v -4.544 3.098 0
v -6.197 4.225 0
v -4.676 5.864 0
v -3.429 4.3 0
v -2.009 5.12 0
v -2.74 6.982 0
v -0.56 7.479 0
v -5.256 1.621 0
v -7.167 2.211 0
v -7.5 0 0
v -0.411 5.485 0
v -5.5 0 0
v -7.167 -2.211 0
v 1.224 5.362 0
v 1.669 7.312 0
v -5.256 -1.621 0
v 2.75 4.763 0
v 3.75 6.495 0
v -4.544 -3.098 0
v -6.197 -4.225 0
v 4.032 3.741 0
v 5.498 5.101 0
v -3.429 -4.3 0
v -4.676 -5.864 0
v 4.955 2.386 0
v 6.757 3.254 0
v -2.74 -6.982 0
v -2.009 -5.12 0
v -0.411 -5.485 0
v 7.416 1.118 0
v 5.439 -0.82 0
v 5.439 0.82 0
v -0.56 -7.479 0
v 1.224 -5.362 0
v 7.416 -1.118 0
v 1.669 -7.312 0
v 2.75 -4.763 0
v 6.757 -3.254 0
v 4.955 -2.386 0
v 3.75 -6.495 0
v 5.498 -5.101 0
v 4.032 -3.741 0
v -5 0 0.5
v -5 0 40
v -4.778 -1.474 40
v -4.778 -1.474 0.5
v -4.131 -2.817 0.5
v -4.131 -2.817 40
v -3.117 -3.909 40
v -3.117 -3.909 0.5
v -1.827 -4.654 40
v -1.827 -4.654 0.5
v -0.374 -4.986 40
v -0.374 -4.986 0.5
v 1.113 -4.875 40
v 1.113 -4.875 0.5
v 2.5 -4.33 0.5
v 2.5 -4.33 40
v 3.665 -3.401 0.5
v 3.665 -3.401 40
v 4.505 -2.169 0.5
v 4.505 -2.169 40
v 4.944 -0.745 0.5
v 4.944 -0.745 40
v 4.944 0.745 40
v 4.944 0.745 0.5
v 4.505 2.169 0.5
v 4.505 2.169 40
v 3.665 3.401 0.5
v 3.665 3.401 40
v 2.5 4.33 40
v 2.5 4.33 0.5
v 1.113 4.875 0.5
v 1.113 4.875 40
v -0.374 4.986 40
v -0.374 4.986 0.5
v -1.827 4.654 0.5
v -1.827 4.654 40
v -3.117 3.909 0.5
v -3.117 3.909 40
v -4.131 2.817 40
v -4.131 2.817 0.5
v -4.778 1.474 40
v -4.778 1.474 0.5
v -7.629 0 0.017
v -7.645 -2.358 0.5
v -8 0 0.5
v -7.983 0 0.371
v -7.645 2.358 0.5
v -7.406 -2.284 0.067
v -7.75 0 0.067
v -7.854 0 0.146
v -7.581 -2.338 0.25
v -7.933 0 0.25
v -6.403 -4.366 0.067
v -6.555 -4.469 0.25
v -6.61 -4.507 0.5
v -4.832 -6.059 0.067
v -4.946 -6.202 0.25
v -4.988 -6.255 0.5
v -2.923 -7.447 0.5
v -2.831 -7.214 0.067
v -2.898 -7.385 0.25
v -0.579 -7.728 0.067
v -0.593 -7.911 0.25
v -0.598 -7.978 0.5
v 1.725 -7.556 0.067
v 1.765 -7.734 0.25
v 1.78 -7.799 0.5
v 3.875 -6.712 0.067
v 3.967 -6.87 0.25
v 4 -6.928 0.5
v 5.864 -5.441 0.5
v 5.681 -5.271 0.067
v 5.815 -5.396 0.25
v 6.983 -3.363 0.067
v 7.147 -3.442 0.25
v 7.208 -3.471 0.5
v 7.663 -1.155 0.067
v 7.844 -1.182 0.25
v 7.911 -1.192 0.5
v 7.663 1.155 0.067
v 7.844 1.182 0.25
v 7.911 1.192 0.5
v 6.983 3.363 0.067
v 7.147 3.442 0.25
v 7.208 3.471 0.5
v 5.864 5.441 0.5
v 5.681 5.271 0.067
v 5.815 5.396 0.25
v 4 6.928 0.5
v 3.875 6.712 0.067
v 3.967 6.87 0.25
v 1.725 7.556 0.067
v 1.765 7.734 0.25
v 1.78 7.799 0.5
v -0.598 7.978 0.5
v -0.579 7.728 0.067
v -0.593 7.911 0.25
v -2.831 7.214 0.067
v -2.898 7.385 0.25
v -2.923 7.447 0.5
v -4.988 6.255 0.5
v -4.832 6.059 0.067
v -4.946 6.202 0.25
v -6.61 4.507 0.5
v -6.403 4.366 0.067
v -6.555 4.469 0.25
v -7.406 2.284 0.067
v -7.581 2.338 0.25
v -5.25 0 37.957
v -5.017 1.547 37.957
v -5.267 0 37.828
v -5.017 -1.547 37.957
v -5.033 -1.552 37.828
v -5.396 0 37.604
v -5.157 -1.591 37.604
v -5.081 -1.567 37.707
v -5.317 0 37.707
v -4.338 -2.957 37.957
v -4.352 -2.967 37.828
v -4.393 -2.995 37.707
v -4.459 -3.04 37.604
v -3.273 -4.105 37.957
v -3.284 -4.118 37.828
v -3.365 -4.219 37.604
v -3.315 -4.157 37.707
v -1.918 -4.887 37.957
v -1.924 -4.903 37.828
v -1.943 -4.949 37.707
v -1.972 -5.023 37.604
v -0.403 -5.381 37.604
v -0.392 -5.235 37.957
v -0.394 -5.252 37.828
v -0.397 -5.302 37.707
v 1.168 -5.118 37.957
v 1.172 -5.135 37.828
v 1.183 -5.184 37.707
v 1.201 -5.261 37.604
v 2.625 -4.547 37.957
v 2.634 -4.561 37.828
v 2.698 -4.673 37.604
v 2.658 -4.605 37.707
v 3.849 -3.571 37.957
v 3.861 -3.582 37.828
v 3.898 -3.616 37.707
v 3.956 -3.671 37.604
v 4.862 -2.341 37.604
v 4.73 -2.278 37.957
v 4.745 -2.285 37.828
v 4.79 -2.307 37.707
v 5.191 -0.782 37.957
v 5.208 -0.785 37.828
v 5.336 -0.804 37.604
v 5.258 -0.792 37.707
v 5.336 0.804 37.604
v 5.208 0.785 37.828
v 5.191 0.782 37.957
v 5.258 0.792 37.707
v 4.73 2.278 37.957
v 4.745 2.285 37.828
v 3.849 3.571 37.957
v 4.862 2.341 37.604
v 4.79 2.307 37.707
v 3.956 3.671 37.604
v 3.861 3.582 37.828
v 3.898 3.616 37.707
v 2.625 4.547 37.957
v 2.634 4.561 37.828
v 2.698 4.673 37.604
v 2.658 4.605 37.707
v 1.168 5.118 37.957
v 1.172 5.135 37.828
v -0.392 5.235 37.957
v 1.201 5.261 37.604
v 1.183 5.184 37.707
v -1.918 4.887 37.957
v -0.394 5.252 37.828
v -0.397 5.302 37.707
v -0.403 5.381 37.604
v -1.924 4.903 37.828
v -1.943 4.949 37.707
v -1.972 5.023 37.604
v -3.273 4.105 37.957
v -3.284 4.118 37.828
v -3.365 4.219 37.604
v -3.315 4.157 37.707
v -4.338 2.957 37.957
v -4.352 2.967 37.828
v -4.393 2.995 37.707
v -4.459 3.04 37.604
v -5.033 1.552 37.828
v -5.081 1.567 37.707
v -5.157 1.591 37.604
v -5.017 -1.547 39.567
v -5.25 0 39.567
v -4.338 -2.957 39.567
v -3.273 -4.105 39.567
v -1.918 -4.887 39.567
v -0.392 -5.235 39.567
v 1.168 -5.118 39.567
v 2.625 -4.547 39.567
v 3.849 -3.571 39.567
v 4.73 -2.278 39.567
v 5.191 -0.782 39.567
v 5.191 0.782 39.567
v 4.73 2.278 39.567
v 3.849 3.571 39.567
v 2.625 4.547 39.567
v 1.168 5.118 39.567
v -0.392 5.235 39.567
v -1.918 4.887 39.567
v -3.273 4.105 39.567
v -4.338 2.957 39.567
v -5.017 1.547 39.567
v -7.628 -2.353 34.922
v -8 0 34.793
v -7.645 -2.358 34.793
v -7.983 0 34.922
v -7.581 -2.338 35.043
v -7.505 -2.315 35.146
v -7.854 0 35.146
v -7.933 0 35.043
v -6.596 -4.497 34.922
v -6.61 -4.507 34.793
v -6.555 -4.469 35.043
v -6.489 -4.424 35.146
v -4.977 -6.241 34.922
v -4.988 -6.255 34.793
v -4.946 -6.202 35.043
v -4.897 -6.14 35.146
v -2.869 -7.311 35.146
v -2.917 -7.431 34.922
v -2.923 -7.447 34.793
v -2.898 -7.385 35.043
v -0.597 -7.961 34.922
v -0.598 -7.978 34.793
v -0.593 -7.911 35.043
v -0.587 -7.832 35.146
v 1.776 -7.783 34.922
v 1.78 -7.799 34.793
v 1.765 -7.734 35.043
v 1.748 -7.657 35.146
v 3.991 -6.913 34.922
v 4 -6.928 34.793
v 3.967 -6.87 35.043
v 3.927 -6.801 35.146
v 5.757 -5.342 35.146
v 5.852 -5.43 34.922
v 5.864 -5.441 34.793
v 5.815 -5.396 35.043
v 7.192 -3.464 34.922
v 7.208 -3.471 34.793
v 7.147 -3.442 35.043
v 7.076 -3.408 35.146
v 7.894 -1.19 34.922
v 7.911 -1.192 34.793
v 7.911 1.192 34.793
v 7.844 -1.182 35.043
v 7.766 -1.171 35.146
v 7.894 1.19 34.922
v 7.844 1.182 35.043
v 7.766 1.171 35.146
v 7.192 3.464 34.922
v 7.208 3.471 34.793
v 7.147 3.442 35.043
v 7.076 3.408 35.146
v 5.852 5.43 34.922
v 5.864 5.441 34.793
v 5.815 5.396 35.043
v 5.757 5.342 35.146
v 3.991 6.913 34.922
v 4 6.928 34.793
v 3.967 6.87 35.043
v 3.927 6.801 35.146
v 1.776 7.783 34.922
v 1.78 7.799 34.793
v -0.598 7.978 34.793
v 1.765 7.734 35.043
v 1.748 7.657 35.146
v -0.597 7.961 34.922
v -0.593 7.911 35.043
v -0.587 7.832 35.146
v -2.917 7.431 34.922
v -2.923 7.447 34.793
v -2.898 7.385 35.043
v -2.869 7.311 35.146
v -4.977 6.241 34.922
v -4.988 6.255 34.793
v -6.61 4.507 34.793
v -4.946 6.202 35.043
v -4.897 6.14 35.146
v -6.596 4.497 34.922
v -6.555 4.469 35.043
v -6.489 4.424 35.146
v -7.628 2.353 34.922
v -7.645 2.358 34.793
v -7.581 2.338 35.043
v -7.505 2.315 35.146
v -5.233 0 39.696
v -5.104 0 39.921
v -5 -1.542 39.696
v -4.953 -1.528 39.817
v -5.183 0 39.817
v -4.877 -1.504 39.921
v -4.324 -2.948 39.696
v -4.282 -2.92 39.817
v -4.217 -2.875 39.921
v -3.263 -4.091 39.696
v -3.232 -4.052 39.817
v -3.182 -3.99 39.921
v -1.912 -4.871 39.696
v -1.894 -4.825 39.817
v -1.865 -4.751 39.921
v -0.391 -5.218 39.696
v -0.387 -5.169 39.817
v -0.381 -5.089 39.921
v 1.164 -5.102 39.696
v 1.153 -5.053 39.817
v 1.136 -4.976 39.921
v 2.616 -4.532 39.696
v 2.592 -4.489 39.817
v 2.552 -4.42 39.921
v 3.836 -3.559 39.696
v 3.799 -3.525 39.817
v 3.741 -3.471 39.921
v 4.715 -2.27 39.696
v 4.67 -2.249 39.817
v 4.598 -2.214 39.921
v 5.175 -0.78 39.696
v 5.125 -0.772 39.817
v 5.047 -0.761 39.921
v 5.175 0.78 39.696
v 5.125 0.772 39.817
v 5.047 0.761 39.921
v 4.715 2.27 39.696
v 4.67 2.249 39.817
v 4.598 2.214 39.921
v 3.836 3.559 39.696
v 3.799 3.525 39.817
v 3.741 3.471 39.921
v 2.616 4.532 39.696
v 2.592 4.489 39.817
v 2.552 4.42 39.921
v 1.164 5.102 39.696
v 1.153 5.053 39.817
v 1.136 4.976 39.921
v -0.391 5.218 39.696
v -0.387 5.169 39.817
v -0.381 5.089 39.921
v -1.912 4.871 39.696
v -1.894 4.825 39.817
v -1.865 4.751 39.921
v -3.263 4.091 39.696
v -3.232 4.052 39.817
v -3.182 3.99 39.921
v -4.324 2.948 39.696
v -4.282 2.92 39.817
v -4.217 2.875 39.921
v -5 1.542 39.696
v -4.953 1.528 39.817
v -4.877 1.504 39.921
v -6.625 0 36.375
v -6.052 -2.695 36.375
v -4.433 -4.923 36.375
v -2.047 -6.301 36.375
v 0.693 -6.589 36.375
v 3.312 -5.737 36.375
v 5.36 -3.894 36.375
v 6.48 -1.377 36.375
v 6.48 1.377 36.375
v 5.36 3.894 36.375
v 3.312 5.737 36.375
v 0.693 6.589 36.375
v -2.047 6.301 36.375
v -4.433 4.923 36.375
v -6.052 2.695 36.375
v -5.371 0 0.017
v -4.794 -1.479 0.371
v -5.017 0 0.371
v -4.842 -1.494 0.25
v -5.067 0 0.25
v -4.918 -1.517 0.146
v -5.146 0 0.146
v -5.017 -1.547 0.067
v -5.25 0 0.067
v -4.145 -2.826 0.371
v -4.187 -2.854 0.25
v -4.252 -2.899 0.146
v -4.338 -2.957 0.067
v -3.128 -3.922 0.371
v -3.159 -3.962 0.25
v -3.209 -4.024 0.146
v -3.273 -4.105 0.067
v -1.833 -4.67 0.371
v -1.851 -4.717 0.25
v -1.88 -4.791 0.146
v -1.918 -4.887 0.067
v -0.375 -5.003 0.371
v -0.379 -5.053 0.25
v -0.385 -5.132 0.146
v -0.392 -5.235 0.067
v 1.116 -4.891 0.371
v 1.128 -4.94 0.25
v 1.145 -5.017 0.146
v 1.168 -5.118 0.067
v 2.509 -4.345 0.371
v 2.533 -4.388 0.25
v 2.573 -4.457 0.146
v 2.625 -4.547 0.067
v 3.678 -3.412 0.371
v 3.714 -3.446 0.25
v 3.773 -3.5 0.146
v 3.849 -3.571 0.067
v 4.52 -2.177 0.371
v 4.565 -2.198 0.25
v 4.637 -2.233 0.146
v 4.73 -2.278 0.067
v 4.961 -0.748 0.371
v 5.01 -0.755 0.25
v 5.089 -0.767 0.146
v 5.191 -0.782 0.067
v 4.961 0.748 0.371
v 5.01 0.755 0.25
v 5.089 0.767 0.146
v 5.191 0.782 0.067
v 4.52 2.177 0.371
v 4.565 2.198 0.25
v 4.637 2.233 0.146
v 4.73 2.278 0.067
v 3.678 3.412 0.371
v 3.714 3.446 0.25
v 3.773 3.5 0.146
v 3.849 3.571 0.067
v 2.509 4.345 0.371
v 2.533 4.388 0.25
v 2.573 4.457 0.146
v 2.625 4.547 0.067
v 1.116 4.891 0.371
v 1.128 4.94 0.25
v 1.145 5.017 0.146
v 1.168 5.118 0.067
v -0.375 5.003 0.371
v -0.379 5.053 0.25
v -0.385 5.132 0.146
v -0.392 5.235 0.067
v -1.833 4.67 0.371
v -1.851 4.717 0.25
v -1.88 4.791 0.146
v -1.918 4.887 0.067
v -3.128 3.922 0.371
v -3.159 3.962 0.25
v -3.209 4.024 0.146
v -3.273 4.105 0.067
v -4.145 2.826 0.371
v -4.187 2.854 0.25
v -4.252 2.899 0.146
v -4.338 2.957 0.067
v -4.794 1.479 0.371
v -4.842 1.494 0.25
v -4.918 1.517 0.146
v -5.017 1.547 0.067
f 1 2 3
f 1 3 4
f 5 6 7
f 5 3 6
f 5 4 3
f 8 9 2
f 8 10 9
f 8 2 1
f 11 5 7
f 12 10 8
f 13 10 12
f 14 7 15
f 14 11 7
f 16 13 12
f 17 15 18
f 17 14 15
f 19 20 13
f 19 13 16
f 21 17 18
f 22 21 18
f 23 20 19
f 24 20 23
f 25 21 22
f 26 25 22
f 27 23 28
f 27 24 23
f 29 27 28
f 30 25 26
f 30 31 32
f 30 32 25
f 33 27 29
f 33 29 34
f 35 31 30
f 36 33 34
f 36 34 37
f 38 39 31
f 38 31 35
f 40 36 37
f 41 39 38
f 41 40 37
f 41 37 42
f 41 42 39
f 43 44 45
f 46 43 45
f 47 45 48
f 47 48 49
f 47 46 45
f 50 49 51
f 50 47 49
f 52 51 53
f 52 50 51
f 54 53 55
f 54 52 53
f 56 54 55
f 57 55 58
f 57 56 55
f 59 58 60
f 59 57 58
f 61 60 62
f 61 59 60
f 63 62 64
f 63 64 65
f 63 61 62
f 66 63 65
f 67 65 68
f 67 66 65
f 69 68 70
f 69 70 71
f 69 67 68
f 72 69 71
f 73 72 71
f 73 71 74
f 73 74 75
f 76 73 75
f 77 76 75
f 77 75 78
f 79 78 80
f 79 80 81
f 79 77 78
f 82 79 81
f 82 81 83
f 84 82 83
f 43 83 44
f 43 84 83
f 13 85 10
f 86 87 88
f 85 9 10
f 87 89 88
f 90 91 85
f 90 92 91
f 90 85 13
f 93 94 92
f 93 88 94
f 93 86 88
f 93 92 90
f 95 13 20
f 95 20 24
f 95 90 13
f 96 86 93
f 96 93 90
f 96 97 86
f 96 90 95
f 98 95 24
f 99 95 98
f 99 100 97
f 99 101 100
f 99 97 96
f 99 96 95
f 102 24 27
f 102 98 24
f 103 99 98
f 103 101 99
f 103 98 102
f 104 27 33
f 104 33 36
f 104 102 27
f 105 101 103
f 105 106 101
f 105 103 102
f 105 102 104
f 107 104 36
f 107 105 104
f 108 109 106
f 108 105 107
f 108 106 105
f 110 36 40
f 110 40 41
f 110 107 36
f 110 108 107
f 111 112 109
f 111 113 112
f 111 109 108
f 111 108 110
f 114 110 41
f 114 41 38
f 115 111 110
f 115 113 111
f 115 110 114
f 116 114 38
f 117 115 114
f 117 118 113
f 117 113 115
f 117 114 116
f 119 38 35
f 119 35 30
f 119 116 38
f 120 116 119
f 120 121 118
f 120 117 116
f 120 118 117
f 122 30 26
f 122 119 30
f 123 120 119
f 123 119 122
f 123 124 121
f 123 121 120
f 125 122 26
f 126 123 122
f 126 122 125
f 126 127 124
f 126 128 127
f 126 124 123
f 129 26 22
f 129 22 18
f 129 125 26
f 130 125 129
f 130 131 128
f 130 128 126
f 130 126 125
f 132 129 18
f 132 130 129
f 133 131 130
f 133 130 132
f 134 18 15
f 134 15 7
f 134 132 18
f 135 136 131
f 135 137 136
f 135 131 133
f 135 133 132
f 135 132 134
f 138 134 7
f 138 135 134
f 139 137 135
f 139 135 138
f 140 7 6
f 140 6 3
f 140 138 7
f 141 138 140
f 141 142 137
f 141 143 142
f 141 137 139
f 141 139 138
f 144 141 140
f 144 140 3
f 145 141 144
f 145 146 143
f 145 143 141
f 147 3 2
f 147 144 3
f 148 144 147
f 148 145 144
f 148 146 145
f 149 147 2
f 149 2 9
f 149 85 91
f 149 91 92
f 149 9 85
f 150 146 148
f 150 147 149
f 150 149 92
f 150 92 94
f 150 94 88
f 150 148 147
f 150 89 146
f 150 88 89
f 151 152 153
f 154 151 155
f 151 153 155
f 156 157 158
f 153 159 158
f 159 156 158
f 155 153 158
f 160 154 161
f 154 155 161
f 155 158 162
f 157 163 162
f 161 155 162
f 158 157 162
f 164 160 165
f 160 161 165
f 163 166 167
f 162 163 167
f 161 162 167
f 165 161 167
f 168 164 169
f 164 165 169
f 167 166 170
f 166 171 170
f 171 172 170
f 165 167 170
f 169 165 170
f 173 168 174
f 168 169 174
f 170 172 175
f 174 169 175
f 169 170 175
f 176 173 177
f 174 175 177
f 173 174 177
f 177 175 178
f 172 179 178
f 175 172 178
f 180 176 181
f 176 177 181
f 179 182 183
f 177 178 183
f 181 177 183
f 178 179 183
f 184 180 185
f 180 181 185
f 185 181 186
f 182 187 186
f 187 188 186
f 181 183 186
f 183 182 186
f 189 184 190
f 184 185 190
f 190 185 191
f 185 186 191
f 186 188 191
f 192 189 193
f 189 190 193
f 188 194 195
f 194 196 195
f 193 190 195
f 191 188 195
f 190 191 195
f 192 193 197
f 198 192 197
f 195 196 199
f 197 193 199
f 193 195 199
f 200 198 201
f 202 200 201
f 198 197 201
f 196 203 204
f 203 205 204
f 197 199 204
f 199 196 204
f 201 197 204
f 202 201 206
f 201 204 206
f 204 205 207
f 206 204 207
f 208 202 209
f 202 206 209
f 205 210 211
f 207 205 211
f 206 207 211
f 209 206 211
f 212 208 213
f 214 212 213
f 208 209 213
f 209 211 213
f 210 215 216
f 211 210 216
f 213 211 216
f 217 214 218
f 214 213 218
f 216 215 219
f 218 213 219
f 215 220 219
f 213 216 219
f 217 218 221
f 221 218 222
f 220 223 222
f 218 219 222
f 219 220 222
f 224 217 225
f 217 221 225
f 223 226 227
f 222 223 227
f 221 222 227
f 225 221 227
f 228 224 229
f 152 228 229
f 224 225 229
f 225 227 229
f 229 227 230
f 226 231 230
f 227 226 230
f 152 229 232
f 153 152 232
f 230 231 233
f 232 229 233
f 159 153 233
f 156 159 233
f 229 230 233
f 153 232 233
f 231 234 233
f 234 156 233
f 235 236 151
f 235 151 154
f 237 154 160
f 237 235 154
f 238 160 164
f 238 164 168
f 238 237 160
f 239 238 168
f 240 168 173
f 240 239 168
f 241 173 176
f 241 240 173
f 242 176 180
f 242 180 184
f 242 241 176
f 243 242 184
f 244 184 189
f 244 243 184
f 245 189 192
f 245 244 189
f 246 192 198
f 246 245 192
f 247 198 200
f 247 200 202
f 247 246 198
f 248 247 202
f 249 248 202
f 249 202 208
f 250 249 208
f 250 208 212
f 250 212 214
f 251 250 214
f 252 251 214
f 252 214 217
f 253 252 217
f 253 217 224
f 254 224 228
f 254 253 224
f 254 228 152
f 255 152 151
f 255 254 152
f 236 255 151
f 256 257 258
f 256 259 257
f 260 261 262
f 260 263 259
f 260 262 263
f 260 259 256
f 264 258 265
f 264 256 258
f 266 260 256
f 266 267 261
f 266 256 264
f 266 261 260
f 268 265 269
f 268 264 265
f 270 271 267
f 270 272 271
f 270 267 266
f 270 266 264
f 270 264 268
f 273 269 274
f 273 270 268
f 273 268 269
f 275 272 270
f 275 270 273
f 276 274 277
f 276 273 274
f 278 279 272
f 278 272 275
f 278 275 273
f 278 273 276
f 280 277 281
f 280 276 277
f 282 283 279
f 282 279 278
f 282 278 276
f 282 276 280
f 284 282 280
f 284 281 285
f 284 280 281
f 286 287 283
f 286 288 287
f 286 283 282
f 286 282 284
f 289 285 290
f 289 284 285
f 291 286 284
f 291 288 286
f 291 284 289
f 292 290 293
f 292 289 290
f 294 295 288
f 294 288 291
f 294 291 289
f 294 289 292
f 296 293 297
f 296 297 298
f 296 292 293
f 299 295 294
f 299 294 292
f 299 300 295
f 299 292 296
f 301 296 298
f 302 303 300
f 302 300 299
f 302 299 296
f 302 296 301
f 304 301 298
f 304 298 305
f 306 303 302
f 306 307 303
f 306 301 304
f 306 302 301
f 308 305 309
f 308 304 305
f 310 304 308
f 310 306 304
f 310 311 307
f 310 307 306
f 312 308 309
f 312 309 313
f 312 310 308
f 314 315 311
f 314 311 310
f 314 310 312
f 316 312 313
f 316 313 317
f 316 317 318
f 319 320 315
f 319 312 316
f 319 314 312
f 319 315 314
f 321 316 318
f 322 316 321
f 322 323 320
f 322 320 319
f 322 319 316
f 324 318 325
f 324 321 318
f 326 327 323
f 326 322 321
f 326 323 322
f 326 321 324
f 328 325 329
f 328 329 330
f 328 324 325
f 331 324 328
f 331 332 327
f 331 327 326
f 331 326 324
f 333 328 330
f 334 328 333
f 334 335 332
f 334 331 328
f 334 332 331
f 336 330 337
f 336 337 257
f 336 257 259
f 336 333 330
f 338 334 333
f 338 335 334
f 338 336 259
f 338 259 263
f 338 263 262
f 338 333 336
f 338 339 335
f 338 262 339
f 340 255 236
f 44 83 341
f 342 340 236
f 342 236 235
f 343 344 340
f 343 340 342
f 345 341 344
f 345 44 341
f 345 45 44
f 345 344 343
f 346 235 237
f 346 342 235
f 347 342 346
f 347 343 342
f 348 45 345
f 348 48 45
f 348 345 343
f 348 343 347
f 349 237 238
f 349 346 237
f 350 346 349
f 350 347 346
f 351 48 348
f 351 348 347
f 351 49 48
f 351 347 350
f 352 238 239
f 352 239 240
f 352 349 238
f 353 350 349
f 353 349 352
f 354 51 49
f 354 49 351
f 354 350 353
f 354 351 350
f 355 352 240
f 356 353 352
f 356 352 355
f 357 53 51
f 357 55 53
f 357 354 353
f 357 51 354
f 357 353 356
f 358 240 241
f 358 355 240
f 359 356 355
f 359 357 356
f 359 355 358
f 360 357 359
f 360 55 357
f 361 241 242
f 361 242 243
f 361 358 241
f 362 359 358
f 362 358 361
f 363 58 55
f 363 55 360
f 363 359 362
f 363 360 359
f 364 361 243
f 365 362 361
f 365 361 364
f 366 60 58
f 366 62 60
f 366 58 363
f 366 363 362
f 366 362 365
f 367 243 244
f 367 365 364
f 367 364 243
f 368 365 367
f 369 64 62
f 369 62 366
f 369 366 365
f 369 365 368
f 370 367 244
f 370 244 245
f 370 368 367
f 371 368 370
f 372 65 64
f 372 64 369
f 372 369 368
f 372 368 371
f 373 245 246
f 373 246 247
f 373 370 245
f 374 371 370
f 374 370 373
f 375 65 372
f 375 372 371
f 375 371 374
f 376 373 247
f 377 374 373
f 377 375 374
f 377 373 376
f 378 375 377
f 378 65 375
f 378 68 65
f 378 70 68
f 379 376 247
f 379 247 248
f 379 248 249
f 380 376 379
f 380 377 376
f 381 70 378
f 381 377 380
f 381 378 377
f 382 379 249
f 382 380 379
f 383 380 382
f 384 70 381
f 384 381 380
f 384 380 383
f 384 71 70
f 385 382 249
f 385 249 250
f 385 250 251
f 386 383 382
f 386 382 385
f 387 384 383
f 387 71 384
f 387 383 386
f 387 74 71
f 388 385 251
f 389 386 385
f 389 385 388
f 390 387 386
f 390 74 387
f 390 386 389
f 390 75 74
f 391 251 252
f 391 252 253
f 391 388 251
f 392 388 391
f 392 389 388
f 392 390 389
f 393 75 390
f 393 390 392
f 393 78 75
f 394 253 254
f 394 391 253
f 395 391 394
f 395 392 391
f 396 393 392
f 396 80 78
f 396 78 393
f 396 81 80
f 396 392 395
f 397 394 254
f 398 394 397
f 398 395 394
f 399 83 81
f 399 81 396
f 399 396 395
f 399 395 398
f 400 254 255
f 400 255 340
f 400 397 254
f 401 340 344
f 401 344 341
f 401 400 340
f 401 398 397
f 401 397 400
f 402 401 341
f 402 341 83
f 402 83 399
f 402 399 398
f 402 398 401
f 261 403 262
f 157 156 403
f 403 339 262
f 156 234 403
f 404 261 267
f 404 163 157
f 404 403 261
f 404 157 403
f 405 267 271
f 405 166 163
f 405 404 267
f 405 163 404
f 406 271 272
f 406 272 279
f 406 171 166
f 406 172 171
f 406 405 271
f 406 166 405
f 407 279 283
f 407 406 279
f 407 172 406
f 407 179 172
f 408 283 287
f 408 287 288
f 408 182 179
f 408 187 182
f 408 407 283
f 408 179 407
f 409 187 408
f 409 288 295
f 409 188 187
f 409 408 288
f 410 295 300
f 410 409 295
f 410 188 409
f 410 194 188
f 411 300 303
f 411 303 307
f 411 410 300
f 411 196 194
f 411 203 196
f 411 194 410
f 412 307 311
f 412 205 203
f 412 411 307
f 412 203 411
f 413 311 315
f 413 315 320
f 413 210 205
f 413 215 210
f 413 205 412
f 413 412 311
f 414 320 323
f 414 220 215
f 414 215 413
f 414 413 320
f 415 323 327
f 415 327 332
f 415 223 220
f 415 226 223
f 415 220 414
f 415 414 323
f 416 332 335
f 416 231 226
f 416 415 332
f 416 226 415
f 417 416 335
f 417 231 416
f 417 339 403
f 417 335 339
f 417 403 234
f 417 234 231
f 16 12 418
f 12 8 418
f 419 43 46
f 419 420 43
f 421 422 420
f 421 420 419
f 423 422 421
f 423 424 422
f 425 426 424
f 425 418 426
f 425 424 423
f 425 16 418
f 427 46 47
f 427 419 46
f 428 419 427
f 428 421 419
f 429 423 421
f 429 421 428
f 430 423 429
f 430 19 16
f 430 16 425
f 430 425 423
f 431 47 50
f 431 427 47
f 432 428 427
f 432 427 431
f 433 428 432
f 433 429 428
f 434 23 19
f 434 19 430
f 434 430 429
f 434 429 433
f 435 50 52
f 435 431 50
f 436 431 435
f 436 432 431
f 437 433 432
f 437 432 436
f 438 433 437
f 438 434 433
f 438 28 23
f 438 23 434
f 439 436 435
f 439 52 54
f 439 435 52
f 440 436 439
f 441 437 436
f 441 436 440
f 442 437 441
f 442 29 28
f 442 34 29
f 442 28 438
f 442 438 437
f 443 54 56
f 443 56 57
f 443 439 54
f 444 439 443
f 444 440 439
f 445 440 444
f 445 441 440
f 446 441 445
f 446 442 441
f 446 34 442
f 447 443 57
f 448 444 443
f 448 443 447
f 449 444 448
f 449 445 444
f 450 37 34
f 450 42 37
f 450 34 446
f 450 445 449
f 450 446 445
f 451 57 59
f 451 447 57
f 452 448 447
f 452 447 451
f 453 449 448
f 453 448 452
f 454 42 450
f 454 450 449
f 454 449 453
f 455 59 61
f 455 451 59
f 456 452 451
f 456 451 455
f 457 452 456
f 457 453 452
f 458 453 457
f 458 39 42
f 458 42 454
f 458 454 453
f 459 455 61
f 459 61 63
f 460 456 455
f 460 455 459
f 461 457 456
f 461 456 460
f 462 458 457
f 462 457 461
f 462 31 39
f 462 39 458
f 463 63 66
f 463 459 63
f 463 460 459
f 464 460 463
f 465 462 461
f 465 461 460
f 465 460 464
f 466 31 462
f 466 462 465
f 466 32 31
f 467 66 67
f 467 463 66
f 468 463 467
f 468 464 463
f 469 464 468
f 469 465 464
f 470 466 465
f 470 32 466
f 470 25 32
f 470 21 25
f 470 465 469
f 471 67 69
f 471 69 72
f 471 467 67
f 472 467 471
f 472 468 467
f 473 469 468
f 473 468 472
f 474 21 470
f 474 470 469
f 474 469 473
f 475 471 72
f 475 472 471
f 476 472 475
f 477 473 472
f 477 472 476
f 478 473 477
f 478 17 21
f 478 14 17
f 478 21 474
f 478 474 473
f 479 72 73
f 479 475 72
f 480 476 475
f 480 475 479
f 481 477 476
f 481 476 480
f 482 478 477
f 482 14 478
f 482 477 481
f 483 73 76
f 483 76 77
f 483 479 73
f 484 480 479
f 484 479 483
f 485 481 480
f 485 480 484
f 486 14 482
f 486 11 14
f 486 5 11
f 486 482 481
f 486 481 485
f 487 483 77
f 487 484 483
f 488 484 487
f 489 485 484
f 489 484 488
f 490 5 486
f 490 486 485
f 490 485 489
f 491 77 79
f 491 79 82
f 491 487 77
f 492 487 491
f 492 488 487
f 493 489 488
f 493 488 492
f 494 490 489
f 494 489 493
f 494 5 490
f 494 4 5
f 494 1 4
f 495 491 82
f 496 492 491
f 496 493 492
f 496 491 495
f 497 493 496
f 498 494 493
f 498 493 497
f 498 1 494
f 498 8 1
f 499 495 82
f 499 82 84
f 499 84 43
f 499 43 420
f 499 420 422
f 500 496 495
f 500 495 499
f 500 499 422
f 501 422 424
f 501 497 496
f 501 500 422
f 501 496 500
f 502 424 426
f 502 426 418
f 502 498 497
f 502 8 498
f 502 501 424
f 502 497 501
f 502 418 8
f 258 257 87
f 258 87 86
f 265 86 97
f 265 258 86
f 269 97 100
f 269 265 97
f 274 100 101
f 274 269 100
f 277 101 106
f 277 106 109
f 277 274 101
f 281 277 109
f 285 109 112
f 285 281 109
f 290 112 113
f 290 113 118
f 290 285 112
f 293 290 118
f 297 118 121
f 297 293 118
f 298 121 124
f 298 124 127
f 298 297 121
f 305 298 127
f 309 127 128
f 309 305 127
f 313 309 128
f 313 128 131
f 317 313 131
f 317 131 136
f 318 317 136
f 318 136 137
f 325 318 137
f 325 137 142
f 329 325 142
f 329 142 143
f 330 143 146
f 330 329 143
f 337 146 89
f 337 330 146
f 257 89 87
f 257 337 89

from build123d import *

# Parameters (mm, degrees)
FILLET1_R = 0.5


with BuildPart() as part:
    # Sketch3 → Revolve2 (revolve)
    with BuildSketch(Plane(origin=(0, 0, 0), x_dir=(1, 0, 0), z_dir=(0, 1, 0)), mode=Mode.PRIVATE) as revolve2_sk:
        Polygon((8, 0), (8, -35), (5.25, -37.75), (5.25, -40), (5, -40), (5, 0), align=None)
    revolve(revolve2_sk.sketch.rotate(Axis((0, 0, 0), (0, 0, 1)), 180), axis=Axis((0, 0, 0), (0, 0, 1)))

    # Fillet1
    # the kernel refuses this fillet: 0.5 mm, written as the material it adds along each edge
    with BuildSketch(Plane(origin=(0, 0, 37.75), x_dir=(-1, 0, 0), z_dir=(0, 1, 0))) as fillet1_piece_1:
        with BuildLine():
            CenterArc((5.25 + FILLET1_R, FILLET1_R * 0.414213562373), FILLET1_R, 180, 45)
            Line((5.25, FILLET1_R * 0.414213562373), (5.25, 0))
            Line((5.25, 0), (5.25 + FILLET1_R * 0.292893218813, -FILLET1_R * 0.292893218813))
        make_face()
    revolve(axis=Axis((0, 0, 37.75), (0, 0, 1)))
    # the kernel refuses this fillet: 0.5 mm, written as the material it takes off along each edge
    with BuildSketch(Plane(origin=(0, 0, 0), x_dir=(-1, 0, 0), z_dir=(0, 1, 0))) as fillet1_2_piece_1:
        with BuildLine():
            CenterArc((8 - FILLET1_R, FILLET1_R), FILLET1_R, 270, 90)
            Line((8 - FILLET1_R, 0), (8, 0))
            Line((8, 0), (8, FILLET1_R))
        make_face()
    revolve(axis=Axis((0, 0, 0), (0, 0, 1)), mode=Mode.SUBTRACT)
    with BuildSketch(Plane(origin=(0, 0, 35), x_dir=(-1, 0, 0), z_dir=(0, 1, 0))) as fillet1_2_piece_2:
        with BuildLine():
            CenterArc((8 - FILLET1_R, -FILLET1_R * 0.414213562373), FILLET1_R, 0, 45)
            Line((8 - FILLET1_R * 0.292893218813, FILLET1_R * 0.292893218813), (8, 0))
            Line((8, 0), (8, -FILLET1_R * 0.414213562373))
        make_face()
    revolve(axis=Axis((0, 0, 35), (0, 0, 1)), mode=Mode.SUBTRACT)
    with BuildSketch(Plane(origin=(0, 0, 40), x_dir=(-1, 0, 0), z_dir=(0, 1, 0))) as fillet1_2_piece_3:
        with BuildLine():
            CenterArc((4.75, -0.433012702), FILLET1_R, 0, 60)
            Line((5.25, -0.433012702), (5.25, 0))
            Line((5.25, 0), (5, 0))
        make_face()
    revolve(axis=Axis((0, 0, 40), (0, 0, 1)), mode=Mode.SUBTRACT)
    with BuildSketch(Plane(origin=(0, 0, 0), x_dir=(-1, 0, 0), z_dir=(0, 1, 0))) as fillet1_2_piece_4:
        with BuildLine():
            CenterArc((5 + FILLET1_R, FILLET1_R), FILLET1_R, 180, 90)
            Line((5, FILLET1_R), (5, 0))
            Line((5, 0), (5 + FILLET1_R, 0))
        make_face()
    revolve(axis=Axis((0, 0, 0), (0, 0, 1)), mode=Mode.SUBTRACT)


solid = part.part
